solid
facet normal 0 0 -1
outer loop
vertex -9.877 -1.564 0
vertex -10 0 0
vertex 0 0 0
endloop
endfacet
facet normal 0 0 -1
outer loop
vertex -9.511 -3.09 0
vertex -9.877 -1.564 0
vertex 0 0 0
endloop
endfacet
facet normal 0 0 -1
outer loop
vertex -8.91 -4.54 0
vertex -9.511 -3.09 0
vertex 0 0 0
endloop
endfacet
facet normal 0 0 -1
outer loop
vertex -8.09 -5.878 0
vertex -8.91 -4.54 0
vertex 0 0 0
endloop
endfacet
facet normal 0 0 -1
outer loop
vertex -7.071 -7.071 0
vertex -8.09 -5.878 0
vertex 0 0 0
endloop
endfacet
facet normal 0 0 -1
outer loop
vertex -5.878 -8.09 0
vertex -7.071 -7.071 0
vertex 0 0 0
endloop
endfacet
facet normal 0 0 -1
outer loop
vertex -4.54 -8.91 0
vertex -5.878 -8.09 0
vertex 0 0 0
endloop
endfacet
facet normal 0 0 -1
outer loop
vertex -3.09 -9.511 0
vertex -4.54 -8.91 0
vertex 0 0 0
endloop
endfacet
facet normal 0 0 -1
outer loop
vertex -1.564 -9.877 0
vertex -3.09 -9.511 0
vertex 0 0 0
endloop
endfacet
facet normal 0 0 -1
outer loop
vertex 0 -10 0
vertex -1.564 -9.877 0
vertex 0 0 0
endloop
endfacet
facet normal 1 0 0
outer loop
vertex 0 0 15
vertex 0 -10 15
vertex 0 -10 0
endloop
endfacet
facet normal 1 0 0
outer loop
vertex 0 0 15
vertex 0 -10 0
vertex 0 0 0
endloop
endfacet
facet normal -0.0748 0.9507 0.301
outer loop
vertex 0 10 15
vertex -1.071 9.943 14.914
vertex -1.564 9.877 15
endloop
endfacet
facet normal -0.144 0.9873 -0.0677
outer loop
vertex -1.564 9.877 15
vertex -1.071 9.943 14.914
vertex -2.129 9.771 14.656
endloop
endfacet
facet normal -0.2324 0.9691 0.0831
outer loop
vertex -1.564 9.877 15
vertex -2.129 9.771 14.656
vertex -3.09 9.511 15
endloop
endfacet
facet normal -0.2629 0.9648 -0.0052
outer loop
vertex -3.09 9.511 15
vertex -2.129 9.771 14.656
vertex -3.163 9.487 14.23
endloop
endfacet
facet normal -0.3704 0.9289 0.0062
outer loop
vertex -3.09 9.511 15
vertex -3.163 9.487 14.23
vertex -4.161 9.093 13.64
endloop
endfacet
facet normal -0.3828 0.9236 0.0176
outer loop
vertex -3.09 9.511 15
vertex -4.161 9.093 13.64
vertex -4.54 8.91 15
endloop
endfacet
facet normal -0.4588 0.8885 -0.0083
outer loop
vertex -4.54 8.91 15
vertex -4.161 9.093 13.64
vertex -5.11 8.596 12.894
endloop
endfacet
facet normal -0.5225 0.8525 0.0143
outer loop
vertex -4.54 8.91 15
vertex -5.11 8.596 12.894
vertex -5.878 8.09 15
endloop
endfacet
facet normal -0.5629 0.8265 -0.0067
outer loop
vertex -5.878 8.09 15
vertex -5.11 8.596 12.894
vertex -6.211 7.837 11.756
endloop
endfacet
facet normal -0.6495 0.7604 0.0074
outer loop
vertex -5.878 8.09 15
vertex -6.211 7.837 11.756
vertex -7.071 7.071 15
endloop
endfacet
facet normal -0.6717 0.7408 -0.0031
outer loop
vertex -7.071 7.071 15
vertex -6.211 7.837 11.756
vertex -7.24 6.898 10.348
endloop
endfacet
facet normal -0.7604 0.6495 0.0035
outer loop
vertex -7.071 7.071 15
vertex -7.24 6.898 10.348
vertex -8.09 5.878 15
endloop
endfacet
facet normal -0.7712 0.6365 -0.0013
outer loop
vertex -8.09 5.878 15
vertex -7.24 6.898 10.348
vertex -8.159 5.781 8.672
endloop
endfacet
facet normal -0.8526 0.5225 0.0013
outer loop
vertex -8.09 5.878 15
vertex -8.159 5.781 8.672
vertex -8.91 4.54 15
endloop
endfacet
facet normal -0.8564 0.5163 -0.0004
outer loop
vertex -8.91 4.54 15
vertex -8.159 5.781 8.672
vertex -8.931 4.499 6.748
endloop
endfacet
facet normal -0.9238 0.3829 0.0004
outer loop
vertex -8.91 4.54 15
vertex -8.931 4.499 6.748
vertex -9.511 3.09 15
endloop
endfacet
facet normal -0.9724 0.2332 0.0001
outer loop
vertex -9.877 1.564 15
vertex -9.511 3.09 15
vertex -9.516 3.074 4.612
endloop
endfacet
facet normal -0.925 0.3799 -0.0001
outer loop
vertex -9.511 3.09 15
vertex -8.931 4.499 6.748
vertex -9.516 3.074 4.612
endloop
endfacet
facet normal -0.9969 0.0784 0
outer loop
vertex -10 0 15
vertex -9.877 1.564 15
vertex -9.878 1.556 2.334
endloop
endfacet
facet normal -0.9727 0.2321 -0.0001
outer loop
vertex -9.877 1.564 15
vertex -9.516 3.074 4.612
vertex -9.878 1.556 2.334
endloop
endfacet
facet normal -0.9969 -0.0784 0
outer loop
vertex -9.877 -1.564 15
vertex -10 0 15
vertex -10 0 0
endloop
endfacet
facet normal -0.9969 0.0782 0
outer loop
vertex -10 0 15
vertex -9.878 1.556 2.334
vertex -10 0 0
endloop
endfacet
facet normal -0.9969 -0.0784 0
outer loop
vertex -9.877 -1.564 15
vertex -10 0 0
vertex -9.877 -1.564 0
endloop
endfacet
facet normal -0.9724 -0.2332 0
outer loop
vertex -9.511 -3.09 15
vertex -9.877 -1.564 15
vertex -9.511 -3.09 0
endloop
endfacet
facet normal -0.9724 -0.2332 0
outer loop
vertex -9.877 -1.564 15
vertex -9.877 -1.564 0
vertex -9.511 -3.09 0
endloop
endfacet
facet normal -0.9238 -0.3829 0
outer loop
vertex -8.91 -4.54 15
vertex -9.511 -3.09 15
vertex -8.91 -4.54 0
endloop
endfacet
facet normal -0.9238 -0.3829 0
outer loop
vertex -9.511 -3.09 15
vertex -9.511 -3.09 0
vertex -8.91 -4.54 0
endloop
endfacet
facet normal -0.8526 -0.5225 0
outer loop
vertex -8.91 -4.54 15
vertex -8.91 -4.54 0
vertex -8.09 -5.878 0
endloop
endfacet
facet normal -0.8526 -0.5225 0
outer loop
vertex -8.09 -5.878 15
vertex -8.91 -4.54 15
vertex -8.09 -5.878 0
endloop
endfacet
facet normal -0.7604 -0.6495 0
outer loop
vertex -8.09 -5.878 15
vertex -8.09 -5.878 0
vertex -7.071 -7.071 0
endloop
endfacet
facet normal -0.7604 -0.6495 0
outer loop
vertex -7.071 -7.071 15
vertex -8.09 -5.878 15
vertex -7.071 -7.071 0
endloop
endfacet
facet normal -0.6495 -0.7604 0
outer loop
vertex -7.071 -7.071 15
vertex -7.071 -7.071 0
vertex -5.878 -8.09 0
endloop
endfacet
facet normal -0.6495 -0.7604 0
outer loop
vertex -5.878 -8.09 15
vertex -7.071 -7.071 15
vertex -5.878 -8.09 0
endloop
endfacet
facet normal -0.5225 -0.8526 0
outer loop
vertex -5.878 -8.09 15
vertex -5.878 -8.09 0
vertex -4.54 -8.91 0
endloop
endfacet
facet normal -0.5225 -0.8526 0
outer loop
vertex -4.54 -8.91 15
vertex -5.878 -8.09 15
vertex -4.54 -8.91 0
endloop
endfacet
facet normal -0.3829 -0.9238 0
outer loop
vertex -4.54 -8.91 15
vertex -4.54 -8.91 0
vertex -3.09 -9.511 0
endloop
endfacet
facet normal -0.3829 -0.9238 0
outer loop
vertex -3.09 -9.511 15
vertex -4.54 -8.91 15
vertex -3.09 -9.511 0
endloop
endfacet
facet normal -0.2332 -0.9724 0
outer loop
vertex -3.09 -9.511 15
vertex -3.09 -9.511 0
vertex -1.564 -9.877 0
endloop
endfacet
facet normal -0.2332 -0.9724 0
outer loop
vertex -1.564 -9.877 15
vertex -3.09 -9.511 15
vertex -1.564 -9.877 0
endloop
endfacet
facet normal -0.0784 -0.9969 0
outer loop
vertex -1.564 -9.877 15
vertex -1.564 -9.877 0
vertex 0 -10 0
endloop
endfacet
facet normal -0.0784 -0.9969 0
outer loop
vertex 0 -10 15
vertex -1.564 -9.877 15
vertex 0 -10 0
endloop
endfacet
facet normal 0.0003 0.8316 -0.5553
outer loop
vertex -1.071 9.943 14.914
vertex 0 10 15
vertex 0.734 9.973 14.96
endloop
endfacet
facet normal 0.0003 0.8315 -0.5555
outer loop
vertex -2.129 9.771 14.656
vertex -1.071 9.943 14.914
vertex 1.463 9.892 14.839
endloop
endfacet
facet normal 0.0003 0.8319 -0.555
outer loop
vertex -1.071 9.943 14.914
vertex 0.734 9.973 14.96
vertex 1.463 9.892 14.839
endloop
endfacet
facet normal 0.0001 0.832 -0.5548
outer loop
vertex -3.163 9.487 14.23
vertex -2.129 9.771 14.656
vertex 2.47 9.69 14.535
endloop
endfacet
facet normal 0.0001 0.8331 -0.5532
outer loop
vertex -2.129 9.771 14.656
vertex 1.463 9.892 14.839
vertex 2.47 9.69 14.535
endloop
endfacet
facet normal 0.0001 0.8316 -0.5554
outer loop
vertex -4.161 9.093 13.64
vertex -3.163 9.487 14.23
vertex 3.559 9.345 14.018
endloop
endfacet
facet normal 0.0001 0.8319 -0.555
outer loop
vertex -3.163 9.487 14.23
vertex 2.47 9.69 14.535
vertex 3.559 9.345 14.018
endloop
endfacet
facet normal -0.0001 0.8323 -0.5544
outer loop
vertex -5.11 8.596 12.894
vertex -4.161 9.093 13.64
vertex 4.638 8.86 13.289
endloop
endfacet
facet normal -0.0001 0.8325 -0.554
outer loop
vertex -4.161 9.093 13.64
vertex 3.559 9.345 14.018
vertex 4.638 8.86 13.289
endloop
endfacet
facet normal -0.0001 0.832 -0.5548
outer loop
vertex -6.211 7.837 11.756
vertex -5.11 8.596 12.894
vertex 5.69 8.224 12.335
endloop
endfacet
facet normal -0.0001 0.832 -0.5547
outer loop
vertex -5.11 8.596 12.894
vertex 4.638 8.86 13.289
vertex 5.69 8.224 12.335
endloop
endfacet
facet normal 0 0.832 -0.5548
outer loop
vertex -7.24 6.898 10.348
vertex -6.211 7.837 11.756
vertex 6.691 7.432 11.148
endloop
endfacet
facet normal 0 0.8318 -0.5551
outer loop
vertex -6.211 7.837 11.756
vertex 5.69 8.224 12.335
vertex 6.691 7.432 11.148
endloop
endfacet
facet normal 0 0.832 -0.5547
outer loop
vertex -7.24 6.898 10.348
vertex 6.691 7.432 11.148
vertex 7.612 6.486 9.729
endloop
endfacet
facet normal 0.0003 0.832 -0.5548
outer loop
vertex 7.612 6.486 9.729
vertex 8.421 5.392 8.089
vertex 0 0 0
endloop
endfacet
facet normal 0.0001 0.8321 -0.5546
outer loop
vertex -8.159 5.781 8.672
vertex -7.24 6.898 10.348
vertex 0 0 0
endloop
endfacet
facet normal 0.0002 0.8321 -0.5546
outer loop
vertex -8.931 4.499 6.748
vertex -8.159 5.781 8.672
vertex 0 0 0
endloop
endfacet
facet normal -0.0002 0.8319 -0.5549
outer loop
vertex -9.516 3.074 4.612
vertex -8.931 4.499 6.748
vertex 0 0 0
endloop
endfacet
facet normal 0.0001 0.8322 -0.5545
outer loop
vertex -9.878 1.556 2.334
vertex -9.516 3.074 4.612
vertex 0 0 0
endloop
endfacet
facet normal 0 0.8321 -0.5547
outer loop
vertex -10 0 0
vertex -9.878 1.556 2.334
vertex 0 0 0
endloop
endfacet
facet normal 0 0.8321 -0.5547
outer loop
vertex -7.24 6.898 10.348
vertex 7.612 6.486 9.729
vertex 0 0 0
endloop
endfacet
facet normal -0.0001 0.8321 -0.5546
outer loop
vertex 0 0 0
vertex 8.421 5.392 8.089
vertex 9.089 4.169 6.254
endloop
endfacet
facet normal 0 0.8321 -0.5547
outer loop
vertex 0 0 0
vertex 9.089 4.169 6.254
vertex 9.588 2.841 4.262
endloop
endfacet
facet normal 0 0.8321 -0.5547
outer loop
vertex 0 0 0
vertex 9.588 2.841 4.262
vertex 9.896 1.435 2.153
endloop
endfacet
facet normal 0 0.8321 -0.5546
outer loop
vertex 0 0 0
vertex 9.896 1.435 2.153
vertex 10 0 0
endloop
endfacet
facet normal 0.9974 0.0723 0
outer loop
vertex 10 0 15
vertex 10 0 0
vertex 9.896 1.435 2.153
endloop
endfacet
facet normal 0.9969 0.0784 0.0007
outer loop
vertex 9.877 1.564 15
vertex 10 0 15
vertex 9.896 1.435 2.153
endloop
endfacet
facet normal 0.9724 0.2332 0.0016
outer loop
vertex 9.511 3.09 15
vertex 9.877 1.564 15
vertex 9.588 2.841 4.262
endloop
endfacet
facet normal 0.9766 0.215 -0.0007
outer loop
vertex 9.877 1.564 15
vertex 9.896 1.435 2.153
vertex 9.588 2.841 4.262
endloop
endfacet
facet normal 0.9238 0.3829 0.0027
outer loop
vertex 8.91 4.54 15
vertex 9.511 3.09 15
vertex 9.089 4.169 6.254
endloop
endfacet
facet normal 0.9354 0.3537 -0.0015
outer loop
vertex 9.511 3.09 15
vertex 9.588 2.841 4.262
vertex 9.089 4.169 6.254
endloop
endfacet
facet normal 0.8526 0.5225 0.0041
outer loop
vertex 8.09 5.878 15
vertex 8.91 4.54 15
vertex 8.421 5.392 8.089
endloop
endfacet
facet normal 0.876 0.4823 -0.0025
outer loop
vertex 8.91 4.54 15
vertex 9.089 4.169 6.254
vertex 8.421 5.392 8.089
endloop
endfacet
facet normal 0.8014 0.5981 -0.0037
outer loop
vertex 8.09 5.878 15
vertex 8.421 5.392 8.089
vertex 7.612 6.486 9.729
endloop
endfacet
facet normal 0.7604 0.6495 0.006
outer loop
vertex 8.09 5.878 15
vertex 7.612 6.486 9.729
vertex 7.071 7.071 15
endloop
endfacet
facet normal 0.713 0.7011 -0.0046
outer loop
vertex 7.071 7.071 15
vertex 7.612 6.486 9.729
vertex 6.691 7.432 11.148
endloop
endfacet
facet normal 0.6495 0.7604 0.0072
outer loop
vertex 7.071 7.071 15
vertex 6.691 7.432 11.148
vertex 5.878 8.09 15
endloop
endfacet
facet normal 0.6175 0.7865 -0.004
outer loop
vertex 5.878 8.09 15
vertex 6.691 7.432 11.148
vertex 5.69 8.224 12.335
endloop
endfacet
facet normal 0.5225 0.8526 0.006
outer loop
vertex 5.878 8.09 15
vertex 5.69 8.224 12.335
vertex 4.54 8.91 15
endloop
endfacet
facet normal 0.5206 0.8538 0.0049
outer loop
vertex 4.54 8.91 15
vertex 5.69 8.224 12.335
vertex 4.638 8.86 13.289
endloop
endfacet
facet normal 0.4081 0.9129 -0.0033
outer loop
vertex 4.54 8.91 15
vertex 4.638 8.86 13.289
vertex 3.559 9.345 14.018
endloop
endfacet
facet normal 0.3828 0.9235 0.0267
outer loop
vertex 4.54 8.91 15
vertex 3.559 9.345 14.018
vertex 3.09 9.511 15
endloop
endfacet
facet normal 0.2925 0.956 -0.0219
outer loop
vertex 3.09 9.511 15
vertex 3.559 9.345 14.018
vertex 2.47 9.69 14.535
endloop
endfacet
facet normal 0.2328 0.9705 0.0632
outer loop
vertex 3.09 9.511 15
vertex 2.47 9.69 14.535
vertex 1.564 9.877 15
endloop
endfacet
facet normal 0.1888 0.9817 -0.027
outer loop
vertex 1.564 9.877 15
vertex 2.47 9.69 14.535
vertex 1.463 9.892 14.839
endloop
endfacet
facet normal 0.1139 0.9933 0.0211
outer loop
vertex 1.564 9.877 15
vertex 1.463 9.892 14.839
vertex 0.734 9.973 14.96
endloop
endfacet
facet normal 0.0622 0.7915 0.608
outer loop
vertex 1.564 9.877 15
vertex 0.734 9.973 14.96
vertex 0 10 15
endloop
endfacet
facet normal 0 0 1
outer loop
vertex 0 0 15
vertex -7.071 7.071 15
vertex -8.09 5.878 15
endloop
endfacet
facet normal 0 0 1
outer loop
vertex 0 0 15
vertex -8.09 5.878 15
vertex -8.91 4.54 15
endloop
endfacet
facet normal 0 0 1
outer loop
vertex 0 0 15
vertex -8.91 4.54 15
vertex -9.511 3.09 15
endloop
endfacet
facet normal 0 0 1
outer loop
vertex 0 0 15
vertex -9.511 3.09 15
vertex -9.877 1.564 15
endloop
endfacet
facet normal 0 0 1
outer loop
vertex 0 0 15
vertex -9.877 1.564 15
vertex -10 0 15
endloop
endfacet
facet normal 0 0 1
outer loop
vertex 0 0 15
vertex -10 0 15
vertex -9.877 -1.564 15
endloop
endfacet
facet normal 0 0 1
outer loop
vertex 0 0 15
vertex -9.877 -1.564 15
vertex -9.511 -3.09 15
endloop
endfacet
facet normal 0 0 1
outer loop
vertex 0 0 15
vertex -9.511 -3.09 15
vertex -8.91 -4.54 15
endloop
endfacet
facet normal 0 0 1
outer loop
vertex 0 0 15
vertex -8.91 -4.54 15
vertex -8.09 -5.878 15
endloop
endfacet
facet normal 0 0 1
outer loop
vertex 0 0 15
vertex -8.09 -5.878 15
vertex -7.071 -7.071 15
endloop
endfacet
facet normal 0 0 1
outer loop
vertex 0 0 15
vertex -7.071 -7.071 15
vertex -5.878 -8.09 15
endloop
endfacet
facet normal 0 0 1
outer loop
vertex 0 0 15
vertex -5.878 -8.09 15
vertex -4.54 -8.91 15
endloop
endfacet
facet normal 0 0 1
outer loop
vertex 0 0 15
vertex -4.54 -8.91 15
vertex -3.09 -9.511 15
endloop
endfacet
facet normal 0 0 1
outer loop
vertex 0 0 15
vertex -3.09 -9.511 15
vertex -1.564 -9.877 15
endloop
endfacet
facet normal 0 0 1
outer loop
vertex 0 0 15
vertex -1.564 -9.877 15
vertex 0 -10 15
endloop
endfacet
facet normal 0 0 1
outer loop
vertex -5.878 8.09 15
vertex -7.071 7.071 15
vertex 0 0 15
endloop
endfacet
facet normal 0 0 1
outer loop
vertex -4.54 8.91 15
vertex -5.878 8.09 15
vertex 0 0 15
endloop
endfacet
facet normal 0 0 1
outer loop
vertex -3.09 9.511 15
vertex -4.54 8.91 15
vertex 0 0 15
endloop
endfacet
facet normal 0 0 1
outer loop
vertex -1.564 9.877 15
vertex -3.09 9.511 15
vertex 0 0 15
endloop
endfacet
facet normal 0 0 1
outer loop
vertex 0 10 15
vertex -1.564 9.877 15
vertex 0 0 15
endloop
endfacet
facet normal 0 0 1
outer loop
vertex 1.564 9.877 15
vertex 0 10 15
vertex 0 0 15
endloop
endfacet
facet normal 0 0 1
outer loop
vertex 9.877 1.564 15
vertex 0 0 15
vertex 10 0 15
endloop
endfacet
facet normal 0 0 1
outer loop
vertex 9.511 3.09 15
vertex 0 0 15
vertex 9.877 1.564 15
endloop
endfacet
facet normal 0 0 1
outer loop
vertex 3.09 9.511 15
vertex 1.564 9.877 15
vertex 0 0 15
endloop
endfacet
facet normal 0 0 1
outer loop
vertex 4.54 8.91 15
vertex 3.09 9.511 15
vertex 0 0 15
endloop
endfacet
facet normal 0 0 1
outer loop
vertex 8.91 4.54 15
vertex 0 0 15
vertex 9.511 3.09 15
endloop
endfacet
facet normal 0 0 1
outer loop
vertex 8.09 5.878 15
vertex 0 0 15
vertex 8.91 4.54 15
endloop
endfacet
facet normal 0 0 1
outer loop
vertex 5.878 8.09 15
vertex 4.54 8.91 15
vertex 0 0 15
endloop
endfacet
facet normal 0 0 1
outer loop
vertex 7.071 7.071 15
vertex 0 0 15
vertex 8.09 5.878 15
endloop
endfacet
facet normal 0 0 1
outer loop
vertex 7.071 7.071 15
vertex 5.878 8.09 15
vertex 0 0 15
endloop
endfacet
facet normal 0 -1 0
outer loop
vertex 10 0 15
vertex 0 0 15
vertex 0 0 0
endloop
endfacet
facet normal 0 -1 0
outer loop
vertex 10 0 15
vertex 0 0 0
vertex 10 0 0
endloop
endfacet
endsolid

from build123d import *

# Parameters (mm, degrees)
SKETCH1_R           = 10
BOSS_EXTRUDE1_DEPTH = 15
CUT_EXTRUDE1_DEPTH  = 16
CUT_EXTRUDE2_DEPTH  = 10
CUT_EXTRUDE3_DEPTH  = 10


with BuildPart() as part:
    # Sketch1 → Boss-Extrude1 (new body)
    with BuildSketch(Plane.XY):
        Circle(SKETCH1_R)
    extrude(amount=BOSS_EXTRUDE1_DEPTH)

    # Sketch2 → Cut-Extrude1 (cut, through all)
    with BuildSketch(Plane.XY.offset(15)):
        with BuildLine():
            Line((0, 0), (10, 0))
            ThreePointArc((10, 0), (7.071067812, -7.071067812), (0, -10))
            Line((0, -10), (0, 0))
        make_face()
    extrude(amount=-CUT_EXTRUDE1_DEPTH, mode=Mode.SUBTRACT)

    # Sketch5 → Cut-Extrude2 (cut)
    with BuildSketch(Plane(origin=(10, 0, 0), x_dir=(0, 0, -1), z_dir=(1, 0, 0))):
        Polygon((0, 0), (0, 10), (-15, 10), align=None)
    extrude(amount=-CUT_EXTRUDE2_DEPTH, mode=Mode.SUBTRACT)

    # Sketch6 → Cut-Extrude3 (cut)
    with BuildSketch(Plane(origin=(0, 0, 0), x_dir=(0, 0, -1), z_dir=(1, 0, 0))):
        Polygon((-15, 10), (0, 0), (0, 10), align=None)
    extrude(amount=-CUT_EXTRUDE3_DEPTH, mode=Mode.SUBTRACT)


solid = part.part
